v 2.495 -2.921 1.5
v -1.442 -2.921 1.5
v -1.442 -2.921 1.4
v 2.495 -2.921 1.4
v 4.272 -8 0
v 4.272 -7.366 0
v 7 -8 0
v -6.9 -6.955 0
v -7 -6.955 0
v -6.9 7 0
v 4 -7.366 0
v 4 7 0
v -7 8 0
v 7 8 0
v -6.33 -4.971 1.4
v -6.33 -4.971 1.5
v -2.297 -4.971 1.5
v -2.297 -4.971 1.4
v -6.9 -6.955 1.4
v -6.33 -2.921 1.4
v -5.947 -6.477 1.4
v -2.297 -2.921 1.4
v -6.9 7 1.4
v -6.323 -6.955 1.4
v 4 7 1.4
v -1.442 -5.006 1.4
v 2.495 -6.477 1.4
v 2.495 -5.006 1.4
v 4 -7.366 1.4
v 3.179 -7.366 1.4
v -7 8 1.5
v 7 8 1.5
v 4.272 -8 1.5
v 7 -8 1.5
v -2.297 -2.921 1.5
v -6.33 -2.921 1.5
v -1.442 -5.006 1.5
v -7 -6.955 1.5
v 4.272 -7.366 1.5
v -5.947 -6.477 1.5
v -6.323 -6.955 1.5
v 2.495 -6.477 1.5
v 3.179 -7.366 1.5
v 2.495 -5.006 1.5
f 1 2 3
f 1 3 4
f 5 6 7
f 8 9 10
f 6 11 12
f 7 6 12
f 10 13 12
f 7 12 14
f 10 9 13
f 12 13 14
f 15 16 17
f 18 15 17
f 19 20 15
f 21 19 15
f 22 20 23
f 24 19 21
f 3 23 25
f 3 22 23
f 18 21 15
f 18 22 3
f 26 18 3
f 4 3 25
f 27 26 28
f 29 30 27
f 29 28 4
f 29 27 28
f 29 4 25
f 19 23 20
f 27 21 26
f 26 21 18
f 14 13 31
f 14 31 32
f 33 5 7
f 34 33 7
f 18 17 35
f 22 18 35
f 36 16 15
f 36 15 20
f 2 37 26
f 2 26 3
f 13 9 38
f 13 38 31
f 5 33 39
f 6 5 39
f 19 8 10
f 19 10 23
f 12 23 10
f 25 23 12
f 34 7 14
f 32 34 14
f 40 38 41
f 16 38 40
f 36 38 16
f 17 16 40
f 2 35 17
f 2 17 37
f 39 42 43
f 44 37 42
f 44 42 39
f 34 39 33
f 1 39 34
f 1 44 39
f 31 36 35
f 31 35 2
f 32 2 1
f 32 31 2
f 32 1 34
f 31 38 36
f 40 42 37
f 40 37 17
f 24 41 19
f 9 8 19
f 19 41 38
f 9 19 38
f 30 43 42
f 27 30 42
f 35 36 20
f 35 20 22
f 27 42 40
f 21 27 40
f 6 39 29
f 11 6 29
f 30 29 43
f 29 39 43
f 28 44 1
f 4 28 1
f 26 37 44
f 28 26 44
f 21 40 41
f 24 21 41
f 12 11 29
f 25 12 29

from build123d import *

# Parameters (mm, degrees)
F0_W     = 14
F0_H     = 16
F1_DEPTH = 1.5
F2_W     = 10.9
F2_H     = 1.4
F3_DEPTH = 15
F5_DEPTH = 25
F6_W     = 4.033105
F6_H     = 2.050732
F6_W_2   = 3.937547
F6_H_2   = 2.08491
F7_DEPTH = 25


with BuildPart() as f1:
    # F0 (on Top) → F1 (new body)
    with BuildSketch(Plane.XY):
        Rectangle(F0_W, F0_H)
    extrude(amount=F1_DEPTH)

    # F2 (on face) → F3 (cut)
    with BuildSketch(Plane.XZ.offset(8)):
        with Locations((-1.45, 0.7)):
            Rectangle(F2_W, F2_H)
    extrude(amount=-F3_DEPTH, mode=Mode.SUBTRACT)

    # F4 (on face) → F5 (cut)
    with BuildSketch(Plane.XY.offset(1.5)):
        Polygon((-7, -8), (4.272356, -8), (4.272356, -7.365542), (3.178632, -7.365542), (2.495055, -6.476892), (-5.947122, -6.476892), (-6.323089, -6.955396), (-7, -6.955396), align=None)
    extrude(amount=-F5_DEPTH, mode=Mode.SUBTRACT)

    # F6 (on face) → F7 (cut)
    with BuildSketch(Plane.XY.offset(1.5)):
        with Locations((-4.313515, -3.946002)):
            Rectangle(F6_W, F6_H)
        with Locations((0.526281, -3.963091)):
            Rectangle(F6_W_2, F6_H_2)
    extrude(amount=-F7_DEPTH, mode=Mode.SUBTRACT)


solid = f1.part
